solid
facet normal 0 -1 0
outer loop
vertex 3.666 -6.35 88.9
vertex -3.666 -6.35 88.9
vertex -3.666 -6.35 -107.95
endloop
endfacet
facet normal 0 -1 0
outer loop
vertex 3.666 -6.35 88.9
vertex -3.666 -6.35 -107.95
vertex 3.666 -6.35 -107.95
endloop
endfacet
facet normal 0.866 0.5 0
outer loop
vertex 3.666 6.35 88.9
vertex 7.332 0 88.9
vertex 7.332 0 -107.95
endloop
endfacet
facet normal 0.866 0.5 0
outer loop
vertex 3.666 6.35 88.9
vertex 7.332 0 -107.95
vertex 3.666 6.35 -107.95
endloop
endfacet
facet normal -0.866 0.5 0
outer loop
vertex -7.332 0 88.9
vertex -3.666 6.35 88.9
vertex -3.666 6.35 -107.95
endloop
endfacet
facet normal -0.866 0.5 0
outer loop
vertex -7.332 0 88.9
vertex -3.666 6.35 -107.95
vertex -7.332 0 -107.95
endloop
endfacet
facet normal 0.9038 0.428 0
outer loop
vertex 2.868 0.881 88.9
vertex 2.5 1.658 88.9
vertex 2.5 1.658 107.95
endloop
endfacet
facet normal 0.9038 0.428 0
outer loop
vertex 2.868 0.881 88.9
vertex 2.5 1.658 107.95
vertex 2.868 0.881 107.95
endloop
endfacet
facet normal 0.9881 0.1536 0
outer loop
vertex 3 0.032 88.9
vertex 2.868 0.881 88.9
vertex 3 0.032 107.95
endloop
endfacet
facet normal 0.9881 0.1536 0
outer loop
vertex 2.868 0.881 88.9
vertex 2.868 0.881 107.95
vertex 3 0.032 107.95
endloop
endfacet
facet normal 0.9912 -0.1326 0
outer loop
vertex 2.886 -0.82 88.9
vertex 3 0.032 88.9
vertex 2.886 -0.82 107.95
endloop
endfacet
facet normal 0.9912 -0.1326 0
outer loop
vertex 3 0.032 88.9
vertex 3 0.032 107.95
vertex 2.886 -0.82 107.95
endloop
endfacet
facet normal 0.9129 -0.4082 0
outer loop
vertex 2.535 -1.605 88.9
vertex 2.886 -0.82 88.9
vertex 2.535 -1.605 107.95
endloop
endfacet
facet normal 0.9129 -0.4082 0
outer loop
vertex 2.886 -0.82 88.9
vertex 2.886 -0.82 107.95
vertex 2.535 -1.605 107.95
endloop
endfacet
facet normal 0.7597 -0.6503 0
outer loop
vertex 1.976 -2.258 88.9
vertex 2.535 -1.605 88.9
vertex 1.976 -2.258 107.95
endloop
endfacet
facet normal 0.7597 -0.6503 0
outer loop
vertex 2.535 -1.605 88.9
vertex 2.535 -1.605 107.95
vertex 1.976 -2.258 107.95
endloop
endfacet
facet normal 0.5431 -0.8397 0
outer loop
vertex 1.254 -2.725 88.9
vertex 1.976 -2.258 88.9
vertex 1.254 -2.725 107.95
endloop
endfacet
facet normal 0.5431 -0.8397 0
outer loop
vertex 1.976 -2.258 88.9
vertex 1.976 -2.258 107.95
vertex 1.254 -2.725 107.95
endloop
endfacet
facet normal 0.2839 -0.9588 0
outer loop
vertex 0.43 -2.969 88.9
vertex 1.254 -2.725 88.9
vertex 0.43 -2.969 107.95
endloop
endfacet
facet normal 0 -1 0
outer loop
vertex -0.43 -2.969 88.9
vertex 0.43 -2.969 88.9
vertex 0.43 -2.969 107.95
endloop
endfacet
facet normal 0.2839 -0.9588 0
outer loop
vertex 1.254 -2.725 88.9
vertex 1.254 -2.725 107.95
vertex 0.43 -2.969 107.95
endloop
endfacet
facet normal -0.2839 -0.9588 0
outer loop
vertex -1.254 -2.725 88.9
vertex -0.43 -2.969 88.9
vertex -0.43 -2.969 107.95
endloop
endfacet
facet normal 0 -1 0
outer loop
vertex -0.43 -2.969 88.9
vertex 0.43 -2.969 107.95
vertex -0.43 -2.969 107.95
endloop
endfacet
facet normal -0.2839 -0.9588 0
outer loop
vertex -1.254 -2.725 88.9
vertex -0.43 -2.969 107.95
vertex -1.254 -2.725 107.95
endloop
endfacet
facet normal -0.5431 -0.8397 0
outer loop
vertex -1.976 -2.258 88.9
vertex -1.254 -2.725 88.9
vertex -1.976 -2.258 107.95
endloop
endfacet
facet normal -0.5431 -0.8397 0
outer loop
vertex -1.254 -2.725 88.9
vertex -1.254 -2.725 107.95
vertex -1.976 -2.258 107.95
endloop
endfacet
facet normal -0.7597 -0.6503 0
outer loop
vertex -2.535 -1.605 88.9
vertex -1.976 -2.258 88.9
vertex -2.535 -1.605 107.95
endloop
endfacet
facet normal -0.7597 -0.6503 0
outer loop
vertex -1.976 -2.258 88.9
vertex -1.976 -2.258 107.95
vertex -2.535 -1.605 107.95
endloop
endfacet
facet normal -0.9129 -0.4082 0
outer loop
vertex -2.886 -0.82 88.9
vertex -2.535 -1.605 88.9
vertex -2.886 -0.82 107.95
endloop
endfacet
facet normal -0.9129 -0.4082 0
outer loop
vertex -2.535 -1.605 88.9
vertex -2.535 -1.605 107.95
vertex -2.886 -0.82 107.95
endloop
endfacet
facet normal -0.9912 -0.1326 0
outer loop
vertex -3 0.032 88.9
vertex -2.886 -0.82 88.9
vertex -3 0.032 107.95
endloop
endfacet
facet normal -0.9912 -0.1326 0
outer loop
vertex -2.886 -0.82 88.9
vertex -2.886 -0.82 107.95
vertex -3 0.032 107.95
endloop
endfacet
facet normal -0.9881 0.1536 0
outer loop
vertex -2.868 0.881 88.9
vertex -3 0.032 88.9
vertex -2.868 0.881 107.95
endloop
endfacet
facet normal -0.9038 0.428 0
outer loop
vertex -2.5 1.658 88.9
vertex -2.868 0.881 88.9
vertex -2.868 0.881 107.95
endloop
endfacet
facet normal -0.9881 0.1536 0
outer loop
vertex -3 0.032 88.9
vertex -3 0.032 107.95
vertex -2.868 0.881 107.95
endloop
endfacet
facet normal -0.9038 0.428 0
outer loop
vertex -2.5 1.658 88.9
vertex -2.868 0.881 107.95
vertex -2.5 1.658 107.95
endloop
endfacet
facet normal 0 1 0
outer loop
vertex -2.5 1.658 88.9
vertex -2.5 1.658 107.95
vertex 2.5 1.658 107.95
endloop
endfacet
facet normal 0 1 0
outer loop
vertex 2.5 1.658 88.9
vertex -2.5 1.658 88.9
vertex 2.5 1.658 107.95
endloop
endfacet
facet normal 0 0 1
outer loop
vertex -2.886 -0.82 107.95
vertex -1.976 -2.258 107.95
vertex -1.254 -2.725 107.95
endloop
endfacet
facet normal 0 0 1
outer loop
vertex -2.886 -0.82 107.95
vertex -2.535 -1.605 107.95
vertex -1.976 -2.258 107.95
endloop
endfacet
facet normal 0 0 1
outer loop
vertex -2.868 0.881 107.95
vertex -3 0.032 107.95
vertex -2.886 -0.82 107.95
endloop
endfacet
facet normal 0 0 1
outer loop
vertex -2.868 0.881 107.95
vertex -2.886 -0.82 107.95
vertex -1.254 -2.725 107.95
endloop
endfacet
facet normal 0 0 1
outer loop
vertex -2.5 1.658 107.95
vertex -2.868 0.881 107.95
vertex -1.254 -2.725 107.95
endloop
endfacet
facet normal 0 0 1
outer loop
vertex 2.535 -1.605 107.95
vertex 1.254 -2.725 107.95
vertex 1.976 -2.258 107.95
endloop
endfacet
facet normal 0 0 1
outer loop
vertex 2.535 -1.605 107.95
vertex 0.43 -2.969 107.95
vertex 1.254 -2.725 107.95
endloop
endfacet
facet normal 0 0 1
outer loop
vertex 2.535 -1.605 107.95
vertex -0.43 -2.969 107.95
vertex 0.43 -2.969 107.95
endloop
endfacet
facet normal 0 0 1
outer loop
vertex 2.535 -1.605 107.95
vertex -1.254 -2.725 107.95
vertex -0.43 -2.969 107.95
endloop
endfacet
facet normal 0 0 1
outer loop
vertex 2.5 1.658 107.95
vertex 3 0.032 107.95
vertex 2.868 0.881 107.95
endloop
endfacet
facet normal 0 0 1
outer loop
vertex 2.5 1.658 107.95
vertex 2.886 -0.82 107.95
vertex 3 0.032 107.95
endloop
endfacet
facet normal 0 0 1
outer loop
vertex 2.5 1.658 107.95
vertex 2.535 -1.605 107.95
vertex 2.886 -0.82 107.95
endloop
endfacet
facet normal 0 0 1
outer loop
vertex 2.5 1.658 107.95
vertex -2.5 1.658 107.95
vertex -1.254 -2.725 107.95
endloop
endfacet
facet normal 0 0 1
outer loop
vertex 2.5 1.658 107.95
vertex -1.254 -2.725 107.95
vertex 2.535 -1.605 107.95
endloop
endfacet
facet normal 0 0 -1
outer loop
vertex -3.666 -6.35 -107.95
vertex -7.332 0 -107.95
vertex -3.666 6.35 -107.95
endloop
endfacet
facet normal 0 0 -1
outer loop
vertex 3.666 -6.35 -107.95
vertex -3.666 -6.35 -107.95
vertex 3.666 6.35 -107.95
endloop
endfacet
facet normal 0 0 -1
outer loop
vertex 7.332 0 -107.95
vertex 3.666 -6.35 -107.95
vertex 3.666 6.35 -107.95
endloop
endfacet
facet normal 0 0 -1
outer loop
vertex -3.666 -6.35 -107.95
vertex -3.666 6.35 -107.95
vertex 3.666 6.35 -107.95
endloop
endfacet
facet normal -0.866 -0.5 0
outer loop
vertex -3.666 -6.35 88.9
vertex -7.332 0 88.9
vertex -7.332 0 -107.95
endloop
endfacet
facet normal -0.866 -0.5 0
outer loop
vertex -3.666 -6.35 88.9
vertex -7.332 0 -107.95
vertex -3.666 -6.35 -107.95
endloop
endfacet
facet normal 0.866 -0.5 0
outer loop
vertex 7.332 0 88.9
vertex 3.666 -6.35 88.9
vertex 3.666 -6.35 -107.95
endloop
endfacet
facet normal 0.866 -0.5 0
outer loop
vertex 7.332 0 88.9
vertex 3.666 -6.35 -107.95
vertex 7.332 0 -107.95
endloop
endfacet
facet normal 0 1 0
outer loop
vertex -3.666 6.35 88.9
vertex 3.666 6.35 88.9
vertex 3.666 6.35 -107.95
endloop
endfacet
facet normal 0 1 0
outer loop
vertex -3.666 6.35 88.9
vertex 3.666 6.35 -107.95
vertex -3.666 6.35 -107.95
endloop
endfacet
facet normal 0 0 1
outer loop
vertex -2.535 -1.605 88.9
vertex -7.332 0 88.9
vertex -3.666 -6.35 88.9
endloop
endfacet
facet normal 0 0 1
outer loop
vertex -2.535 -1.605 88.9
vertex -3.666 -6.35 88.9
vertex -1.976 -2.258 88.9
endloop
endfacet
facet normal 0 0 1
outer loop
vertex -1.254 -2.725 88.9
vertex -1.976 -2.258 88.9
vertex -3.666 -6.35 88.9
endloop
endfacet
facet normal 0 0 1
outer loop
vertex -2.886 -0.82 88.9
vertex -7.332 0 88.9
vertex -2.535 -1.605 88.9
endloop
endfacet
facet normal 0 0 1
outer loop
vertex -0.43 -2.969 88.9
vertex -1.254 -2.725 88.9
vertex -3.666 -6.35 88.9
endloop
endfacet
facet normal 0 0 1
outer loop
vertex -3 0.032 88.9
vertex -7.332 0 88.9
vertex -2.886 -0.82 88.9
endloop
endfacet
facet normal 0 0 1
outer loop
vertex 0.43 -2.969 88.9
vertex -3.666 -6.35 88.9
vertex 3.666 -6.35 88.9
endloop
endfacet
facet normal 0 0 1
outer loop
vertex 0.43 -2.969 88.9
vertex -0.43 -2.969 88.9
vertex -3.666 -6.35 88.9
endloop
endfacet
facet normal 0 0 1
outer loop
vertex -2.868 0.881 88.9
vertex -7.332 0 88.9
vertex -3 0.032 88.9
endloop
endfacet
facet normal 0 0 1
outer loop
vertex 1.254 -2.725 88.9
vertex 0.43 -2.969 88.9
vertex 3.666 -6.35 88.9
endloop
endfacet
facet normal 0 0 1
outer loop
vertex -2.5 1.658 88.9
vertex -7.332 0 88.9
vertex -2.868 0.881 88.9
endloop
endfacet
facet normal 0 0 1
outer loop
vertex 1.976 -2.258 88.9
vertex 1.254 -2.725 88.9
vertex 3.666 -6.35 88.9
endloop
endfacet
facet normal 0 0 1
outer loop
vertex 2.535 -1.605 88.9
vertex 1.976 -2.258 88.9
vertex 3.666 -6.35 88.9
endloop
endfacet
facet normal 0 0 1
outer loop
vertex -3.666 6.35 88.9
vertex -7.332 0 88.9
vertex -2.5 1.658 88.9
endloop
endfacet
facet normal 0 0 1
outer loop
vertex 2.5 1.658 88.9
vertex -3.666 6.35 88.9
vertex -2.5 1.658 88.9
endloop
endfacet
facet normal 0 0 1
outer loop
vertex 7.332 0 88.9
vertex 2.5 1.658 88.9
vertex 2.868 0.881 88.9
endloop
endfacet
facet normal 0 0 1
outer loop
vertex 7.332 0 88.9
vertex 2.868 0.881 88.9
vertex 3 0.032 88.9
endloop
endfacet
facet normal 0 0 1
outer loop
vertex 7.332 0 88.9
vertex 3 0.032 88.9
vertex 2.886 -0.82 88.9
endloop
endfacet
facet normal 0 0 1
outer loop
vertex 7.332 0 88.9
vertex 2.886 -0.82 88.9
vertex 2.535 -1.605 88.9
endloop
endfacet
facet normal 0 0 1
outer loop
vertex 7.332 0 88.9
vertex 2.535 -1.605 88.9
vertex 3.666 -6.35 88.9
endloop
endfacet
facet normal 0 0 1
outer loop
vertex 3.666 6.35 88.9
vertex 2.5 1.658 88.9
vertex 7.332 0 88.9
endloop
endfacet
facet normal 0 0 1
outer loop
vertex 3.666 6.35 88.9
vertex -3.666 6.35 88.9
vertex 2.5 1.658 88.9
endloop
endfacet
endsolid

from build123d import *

# Parameters (mm, degrees)
BOSS_EXTRUDE1_DEPTH = 107.95
CUT_EXTRUDE1_DEPTH  = 19.05


with BuildPart() as part:
    # Sketch1 → Boss-Extrude1 (new, symmetric)
    with BuildSketch(Plane.XY):
        Polygon((3.666174209, 6.35), (-3.666174209, 6.35), (-7.332348419, 0), (-3.666174209, -6.35), (3.666174209, -6.35), (7.332348419, 0), align=None)
    extrude(amount=BOSS_EXTRUDE1_DEPTH, both=True)

    # Sketch2 → Cut-Extrude1 (cut)
    with BuildSketch(Plane.XY.offset(107.95)):
        Polygon((-3.666174209, 6.35), (-7.332348419, 0), (-3.666174209, -6.35), (3.666174209, -6.35), (7.332348419, 0), (3.666174209, 6.35), align=None)
        with BuildLine():
            Line((-2.5, 1.658312395), (2.5, 1.658312395))
            ThreePointArc((2.5, 1.658312395), (0, -3), (-2.5, 1.658312395))
        make_face(mode=Mode.SUBTRACT)
    extrude(amount=-CUT_EXTRUDE1_DEPTH, mode=Mode.SUBTRACT)


solid = part.part
